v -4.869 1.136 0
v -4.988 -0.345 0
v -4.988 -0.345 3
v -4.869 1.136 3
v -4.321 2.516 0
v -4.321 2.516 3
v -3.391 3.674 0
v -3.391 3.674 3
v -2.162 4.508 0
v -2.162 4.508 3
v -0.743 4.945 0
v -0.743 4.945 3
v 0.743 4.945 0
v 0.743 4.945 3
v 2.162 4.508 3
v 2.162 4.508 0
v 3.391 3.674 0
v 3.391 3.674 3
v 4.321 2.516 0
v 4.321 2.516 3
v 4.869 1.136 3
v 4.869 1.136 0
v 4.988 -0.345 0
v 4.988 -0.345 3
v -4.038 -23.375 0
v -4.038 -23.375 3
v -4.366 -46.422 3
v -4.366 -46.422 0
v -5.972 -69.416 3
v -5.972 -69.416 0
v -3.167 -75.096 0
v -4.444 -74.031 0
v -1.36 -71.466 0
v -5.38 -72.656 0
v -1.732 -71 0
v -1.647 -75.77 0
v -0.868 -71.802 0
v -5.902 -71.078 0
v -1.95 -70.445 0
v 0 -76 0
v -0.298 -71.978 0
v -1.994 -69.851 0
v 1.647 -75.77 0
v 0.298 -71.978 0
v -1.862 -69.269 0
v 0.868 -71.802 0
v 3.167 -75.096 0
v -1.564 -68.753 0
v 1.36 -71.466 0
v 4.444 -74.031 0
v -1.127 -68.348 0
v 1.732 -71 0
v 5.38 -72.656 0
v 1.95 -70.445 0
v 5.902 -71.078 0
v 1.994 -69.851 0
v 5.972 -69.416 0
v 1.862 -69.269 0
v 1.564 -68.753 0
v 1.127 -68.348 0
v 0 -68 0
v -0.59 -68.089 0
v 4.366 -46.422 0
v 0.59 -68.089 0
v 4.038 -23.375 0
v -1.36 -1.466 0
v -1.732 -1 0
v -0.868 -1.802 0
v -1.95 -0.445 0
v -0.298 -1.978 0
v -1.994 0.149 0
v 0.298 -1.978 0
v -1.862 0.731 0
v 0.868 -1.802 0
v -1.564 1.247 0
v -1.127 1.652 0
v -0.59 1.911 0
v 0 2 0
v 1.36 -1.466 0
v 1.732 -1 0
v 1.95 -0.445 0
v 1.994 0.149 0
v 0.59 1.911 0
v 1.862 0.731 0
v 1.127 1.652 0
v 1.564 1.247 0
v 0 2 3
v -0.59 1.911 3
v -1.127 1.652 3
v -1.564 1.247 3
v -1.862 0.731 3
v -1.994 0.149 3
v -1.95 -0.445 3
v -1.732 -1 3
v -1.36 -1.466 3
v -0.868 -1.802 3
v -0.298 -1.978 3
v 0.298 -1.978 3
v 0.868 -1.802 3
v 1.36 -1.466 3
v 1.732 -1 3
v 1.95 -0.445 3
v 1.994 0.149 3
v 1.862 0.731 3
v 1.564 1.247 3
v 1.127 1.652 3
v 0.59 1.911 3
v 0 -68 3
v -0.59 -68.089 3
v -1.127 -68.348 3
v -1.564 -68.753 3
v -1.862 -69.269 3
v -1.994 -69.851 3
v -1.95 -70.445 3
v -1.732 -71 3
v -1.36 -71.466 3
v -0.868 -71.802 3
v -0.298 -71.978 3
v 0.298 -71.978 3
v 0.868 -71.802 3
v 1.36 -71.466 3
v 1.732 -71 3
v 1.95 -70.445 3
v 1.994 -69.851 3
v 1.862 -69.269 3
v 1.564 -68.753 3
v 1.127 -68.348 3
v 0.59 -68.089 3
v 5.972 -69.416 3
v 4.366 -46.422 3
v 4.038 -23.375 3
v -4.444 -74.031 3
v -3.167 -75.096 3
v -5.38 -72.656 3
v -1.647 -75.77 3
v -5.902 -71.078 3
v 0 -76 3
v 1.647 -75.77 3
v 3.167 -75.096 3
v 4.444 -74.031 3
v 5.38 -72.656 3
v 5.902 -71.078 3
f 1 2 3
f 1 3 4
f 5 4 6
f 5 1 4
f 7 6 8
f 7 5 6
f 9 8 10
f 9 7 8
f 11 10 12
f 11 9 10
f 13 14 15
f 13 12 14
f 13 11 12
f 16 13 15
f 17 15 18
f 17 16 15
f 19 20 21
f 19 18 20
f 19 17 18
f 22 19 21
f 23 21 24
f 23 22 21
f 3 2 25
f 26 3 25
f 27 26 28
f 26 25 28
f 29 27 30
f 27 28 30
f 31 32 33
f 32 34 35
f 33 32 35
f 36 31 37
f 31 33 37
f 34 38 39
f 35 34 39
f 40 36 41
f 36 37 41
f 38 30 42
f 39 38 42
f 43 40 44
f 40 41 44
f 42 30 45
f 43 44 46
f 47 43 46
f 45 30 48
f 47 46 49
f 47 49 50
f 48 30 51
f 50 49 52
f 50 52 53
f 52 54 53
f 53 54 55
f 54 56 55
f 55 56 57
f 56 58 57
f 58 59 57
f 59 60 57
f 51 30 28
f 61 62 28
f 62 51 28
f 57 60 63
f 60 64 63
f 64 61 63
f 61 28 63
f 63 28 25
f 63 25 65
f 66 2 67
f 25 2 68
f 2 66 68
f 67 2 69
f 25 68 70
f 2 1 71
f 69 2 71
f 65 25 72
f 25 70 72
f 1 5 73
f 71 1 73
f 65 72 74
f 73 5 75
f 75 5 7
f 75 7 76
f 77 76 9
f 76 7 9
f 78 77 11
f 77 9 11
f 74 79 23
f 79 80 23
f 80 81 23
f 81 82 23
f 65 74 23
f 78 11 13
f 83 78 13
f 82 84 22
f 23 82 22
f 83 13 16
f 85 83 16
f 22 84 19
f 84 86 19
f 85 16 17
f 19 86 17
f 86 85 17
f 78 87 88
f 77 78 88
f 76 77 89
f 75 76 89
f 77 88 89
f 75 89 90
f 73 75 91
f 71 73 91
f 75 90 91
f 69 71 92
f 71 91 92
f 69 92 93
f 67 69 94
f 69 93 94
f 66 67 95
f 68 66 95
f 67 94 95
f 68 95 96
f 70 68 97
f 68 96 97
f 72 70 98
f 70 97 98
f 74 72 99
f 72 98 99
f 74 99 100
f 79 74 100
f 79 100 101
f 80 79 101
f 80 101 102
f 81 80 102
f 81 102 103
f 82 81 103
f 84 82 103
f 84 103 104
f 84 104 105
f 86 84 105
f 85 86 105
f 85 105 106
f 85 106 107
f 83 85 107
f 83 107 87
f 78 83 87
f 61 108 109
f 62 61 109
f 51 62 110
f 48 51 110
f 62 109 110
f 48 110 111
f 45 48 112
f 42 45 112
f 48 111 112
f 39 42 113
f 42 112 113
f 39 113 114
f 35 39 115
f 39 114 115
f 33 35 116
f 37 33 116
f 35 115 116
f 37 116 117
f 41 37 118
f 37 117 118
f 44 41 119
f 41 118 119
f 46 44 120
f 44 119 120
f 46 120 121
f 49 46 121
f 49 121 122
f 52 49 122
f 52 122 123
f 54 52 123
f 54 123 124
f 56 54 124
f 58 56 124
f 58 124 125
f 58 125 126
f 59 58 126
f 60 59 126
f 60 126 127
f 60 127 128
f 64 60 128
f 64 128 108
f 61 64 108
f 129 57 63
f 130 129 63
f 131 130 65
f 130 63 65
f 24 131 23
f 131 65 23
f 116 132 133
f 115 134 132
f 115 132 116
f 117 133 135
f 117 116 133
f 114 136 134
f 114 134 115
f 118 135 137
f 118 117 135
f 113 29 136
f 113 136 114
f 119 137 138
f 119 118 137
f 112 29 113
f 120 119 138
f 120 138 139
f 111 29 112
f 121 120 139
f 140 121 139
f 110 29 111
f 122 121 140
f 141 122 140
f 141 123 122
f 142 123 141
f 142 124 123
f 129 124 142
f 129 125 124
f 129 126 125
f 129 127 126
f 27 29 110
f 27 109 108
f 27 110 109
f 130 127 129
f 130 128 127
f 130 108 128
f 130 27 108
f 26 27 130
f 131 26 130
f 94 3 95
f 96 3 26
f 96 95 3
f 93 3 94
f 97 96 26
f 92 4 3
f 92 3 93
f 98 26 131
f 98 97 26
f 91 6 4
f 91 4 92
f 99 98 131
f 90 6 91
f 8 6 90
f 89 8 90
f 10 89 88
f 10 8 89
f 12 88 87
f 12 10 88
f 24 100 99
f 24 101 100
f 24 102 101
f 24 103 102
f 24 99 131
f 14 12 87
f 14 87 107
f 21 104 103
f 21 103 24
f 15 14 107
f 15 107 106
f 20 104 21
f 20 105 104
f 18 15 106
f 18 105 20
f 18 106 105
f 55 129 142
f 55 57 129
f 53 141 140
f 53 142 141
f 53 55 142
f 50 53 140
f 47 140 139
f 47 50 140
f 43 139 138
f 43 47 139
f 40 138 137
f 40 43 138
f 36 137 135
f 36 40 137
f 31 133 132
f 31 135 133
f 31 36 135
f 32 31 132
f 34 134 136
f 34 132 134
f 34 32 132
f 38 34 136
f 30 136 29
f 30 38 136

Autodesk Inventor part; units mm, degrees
ref_plane "YZ Plane" through (0, 0, 0) normal (1, 0, 0) x (0, 1, 0)
ref_plane "XZ Plane" through (0, 0, 0) normal (0, 1, 0) x (-1, 0, 0)
ref_plane "XY Plane" through (0, 0, 0) normal (0, 0, 1) x (1, 0, 0)
sketch "スケッチ1" plane through (0, 0, 0) normal (0, 0, 1) x (1, 0, 0)
  line L0 (0, 0) -> (0, -70) construction
  arc A0 (0, -5) -> (4.9881, -0.3446) centre (0, 0) ccw construction
  arc A1 (0, -64) -> (-5.9715, -69.4162) centre (0, -70) ccw construction
  arc A2 (-5.9715, -69.4162) -> (-4.9881, -0.3446) centre (-419.5607, -28.9848) ccw
  arc A3 (4.9881, -0.3446) -> (5.9715, -69.4162) centre (419.5607, -28.9848) ccw
  arc A4 (-4.9881, -0.3446) -> (0, -5) centre (0, 0) ccw construction
  arc A5 (4.9881, -0.3446) -> (-4.9881, -0.3446) centre (0, 0) ccw
  arc A6 (5.9715, -69.4162) -> (0, -64) centre (0, -70) ccw construction
  arc A7 (-5.9715, -69.4162) -> (5.9715, -69.4162) centre (0, -70) ccw
  line L1 (4, 0) -> (4, -70) construction
  dimension "d0" = 70
  dimension "d1" = 5
  dimension "d2" = 6
  dimension "d4" = 4
extrude "押し出し1" add sketch "スケッチ1" along normal blind 3
hole "穴1" at (0, 0, 0) at (0, -70, 0) direction (0, 0, 1) diameter 4 end through all
properties part number "COXA_ROLL_LONG-LINK"
